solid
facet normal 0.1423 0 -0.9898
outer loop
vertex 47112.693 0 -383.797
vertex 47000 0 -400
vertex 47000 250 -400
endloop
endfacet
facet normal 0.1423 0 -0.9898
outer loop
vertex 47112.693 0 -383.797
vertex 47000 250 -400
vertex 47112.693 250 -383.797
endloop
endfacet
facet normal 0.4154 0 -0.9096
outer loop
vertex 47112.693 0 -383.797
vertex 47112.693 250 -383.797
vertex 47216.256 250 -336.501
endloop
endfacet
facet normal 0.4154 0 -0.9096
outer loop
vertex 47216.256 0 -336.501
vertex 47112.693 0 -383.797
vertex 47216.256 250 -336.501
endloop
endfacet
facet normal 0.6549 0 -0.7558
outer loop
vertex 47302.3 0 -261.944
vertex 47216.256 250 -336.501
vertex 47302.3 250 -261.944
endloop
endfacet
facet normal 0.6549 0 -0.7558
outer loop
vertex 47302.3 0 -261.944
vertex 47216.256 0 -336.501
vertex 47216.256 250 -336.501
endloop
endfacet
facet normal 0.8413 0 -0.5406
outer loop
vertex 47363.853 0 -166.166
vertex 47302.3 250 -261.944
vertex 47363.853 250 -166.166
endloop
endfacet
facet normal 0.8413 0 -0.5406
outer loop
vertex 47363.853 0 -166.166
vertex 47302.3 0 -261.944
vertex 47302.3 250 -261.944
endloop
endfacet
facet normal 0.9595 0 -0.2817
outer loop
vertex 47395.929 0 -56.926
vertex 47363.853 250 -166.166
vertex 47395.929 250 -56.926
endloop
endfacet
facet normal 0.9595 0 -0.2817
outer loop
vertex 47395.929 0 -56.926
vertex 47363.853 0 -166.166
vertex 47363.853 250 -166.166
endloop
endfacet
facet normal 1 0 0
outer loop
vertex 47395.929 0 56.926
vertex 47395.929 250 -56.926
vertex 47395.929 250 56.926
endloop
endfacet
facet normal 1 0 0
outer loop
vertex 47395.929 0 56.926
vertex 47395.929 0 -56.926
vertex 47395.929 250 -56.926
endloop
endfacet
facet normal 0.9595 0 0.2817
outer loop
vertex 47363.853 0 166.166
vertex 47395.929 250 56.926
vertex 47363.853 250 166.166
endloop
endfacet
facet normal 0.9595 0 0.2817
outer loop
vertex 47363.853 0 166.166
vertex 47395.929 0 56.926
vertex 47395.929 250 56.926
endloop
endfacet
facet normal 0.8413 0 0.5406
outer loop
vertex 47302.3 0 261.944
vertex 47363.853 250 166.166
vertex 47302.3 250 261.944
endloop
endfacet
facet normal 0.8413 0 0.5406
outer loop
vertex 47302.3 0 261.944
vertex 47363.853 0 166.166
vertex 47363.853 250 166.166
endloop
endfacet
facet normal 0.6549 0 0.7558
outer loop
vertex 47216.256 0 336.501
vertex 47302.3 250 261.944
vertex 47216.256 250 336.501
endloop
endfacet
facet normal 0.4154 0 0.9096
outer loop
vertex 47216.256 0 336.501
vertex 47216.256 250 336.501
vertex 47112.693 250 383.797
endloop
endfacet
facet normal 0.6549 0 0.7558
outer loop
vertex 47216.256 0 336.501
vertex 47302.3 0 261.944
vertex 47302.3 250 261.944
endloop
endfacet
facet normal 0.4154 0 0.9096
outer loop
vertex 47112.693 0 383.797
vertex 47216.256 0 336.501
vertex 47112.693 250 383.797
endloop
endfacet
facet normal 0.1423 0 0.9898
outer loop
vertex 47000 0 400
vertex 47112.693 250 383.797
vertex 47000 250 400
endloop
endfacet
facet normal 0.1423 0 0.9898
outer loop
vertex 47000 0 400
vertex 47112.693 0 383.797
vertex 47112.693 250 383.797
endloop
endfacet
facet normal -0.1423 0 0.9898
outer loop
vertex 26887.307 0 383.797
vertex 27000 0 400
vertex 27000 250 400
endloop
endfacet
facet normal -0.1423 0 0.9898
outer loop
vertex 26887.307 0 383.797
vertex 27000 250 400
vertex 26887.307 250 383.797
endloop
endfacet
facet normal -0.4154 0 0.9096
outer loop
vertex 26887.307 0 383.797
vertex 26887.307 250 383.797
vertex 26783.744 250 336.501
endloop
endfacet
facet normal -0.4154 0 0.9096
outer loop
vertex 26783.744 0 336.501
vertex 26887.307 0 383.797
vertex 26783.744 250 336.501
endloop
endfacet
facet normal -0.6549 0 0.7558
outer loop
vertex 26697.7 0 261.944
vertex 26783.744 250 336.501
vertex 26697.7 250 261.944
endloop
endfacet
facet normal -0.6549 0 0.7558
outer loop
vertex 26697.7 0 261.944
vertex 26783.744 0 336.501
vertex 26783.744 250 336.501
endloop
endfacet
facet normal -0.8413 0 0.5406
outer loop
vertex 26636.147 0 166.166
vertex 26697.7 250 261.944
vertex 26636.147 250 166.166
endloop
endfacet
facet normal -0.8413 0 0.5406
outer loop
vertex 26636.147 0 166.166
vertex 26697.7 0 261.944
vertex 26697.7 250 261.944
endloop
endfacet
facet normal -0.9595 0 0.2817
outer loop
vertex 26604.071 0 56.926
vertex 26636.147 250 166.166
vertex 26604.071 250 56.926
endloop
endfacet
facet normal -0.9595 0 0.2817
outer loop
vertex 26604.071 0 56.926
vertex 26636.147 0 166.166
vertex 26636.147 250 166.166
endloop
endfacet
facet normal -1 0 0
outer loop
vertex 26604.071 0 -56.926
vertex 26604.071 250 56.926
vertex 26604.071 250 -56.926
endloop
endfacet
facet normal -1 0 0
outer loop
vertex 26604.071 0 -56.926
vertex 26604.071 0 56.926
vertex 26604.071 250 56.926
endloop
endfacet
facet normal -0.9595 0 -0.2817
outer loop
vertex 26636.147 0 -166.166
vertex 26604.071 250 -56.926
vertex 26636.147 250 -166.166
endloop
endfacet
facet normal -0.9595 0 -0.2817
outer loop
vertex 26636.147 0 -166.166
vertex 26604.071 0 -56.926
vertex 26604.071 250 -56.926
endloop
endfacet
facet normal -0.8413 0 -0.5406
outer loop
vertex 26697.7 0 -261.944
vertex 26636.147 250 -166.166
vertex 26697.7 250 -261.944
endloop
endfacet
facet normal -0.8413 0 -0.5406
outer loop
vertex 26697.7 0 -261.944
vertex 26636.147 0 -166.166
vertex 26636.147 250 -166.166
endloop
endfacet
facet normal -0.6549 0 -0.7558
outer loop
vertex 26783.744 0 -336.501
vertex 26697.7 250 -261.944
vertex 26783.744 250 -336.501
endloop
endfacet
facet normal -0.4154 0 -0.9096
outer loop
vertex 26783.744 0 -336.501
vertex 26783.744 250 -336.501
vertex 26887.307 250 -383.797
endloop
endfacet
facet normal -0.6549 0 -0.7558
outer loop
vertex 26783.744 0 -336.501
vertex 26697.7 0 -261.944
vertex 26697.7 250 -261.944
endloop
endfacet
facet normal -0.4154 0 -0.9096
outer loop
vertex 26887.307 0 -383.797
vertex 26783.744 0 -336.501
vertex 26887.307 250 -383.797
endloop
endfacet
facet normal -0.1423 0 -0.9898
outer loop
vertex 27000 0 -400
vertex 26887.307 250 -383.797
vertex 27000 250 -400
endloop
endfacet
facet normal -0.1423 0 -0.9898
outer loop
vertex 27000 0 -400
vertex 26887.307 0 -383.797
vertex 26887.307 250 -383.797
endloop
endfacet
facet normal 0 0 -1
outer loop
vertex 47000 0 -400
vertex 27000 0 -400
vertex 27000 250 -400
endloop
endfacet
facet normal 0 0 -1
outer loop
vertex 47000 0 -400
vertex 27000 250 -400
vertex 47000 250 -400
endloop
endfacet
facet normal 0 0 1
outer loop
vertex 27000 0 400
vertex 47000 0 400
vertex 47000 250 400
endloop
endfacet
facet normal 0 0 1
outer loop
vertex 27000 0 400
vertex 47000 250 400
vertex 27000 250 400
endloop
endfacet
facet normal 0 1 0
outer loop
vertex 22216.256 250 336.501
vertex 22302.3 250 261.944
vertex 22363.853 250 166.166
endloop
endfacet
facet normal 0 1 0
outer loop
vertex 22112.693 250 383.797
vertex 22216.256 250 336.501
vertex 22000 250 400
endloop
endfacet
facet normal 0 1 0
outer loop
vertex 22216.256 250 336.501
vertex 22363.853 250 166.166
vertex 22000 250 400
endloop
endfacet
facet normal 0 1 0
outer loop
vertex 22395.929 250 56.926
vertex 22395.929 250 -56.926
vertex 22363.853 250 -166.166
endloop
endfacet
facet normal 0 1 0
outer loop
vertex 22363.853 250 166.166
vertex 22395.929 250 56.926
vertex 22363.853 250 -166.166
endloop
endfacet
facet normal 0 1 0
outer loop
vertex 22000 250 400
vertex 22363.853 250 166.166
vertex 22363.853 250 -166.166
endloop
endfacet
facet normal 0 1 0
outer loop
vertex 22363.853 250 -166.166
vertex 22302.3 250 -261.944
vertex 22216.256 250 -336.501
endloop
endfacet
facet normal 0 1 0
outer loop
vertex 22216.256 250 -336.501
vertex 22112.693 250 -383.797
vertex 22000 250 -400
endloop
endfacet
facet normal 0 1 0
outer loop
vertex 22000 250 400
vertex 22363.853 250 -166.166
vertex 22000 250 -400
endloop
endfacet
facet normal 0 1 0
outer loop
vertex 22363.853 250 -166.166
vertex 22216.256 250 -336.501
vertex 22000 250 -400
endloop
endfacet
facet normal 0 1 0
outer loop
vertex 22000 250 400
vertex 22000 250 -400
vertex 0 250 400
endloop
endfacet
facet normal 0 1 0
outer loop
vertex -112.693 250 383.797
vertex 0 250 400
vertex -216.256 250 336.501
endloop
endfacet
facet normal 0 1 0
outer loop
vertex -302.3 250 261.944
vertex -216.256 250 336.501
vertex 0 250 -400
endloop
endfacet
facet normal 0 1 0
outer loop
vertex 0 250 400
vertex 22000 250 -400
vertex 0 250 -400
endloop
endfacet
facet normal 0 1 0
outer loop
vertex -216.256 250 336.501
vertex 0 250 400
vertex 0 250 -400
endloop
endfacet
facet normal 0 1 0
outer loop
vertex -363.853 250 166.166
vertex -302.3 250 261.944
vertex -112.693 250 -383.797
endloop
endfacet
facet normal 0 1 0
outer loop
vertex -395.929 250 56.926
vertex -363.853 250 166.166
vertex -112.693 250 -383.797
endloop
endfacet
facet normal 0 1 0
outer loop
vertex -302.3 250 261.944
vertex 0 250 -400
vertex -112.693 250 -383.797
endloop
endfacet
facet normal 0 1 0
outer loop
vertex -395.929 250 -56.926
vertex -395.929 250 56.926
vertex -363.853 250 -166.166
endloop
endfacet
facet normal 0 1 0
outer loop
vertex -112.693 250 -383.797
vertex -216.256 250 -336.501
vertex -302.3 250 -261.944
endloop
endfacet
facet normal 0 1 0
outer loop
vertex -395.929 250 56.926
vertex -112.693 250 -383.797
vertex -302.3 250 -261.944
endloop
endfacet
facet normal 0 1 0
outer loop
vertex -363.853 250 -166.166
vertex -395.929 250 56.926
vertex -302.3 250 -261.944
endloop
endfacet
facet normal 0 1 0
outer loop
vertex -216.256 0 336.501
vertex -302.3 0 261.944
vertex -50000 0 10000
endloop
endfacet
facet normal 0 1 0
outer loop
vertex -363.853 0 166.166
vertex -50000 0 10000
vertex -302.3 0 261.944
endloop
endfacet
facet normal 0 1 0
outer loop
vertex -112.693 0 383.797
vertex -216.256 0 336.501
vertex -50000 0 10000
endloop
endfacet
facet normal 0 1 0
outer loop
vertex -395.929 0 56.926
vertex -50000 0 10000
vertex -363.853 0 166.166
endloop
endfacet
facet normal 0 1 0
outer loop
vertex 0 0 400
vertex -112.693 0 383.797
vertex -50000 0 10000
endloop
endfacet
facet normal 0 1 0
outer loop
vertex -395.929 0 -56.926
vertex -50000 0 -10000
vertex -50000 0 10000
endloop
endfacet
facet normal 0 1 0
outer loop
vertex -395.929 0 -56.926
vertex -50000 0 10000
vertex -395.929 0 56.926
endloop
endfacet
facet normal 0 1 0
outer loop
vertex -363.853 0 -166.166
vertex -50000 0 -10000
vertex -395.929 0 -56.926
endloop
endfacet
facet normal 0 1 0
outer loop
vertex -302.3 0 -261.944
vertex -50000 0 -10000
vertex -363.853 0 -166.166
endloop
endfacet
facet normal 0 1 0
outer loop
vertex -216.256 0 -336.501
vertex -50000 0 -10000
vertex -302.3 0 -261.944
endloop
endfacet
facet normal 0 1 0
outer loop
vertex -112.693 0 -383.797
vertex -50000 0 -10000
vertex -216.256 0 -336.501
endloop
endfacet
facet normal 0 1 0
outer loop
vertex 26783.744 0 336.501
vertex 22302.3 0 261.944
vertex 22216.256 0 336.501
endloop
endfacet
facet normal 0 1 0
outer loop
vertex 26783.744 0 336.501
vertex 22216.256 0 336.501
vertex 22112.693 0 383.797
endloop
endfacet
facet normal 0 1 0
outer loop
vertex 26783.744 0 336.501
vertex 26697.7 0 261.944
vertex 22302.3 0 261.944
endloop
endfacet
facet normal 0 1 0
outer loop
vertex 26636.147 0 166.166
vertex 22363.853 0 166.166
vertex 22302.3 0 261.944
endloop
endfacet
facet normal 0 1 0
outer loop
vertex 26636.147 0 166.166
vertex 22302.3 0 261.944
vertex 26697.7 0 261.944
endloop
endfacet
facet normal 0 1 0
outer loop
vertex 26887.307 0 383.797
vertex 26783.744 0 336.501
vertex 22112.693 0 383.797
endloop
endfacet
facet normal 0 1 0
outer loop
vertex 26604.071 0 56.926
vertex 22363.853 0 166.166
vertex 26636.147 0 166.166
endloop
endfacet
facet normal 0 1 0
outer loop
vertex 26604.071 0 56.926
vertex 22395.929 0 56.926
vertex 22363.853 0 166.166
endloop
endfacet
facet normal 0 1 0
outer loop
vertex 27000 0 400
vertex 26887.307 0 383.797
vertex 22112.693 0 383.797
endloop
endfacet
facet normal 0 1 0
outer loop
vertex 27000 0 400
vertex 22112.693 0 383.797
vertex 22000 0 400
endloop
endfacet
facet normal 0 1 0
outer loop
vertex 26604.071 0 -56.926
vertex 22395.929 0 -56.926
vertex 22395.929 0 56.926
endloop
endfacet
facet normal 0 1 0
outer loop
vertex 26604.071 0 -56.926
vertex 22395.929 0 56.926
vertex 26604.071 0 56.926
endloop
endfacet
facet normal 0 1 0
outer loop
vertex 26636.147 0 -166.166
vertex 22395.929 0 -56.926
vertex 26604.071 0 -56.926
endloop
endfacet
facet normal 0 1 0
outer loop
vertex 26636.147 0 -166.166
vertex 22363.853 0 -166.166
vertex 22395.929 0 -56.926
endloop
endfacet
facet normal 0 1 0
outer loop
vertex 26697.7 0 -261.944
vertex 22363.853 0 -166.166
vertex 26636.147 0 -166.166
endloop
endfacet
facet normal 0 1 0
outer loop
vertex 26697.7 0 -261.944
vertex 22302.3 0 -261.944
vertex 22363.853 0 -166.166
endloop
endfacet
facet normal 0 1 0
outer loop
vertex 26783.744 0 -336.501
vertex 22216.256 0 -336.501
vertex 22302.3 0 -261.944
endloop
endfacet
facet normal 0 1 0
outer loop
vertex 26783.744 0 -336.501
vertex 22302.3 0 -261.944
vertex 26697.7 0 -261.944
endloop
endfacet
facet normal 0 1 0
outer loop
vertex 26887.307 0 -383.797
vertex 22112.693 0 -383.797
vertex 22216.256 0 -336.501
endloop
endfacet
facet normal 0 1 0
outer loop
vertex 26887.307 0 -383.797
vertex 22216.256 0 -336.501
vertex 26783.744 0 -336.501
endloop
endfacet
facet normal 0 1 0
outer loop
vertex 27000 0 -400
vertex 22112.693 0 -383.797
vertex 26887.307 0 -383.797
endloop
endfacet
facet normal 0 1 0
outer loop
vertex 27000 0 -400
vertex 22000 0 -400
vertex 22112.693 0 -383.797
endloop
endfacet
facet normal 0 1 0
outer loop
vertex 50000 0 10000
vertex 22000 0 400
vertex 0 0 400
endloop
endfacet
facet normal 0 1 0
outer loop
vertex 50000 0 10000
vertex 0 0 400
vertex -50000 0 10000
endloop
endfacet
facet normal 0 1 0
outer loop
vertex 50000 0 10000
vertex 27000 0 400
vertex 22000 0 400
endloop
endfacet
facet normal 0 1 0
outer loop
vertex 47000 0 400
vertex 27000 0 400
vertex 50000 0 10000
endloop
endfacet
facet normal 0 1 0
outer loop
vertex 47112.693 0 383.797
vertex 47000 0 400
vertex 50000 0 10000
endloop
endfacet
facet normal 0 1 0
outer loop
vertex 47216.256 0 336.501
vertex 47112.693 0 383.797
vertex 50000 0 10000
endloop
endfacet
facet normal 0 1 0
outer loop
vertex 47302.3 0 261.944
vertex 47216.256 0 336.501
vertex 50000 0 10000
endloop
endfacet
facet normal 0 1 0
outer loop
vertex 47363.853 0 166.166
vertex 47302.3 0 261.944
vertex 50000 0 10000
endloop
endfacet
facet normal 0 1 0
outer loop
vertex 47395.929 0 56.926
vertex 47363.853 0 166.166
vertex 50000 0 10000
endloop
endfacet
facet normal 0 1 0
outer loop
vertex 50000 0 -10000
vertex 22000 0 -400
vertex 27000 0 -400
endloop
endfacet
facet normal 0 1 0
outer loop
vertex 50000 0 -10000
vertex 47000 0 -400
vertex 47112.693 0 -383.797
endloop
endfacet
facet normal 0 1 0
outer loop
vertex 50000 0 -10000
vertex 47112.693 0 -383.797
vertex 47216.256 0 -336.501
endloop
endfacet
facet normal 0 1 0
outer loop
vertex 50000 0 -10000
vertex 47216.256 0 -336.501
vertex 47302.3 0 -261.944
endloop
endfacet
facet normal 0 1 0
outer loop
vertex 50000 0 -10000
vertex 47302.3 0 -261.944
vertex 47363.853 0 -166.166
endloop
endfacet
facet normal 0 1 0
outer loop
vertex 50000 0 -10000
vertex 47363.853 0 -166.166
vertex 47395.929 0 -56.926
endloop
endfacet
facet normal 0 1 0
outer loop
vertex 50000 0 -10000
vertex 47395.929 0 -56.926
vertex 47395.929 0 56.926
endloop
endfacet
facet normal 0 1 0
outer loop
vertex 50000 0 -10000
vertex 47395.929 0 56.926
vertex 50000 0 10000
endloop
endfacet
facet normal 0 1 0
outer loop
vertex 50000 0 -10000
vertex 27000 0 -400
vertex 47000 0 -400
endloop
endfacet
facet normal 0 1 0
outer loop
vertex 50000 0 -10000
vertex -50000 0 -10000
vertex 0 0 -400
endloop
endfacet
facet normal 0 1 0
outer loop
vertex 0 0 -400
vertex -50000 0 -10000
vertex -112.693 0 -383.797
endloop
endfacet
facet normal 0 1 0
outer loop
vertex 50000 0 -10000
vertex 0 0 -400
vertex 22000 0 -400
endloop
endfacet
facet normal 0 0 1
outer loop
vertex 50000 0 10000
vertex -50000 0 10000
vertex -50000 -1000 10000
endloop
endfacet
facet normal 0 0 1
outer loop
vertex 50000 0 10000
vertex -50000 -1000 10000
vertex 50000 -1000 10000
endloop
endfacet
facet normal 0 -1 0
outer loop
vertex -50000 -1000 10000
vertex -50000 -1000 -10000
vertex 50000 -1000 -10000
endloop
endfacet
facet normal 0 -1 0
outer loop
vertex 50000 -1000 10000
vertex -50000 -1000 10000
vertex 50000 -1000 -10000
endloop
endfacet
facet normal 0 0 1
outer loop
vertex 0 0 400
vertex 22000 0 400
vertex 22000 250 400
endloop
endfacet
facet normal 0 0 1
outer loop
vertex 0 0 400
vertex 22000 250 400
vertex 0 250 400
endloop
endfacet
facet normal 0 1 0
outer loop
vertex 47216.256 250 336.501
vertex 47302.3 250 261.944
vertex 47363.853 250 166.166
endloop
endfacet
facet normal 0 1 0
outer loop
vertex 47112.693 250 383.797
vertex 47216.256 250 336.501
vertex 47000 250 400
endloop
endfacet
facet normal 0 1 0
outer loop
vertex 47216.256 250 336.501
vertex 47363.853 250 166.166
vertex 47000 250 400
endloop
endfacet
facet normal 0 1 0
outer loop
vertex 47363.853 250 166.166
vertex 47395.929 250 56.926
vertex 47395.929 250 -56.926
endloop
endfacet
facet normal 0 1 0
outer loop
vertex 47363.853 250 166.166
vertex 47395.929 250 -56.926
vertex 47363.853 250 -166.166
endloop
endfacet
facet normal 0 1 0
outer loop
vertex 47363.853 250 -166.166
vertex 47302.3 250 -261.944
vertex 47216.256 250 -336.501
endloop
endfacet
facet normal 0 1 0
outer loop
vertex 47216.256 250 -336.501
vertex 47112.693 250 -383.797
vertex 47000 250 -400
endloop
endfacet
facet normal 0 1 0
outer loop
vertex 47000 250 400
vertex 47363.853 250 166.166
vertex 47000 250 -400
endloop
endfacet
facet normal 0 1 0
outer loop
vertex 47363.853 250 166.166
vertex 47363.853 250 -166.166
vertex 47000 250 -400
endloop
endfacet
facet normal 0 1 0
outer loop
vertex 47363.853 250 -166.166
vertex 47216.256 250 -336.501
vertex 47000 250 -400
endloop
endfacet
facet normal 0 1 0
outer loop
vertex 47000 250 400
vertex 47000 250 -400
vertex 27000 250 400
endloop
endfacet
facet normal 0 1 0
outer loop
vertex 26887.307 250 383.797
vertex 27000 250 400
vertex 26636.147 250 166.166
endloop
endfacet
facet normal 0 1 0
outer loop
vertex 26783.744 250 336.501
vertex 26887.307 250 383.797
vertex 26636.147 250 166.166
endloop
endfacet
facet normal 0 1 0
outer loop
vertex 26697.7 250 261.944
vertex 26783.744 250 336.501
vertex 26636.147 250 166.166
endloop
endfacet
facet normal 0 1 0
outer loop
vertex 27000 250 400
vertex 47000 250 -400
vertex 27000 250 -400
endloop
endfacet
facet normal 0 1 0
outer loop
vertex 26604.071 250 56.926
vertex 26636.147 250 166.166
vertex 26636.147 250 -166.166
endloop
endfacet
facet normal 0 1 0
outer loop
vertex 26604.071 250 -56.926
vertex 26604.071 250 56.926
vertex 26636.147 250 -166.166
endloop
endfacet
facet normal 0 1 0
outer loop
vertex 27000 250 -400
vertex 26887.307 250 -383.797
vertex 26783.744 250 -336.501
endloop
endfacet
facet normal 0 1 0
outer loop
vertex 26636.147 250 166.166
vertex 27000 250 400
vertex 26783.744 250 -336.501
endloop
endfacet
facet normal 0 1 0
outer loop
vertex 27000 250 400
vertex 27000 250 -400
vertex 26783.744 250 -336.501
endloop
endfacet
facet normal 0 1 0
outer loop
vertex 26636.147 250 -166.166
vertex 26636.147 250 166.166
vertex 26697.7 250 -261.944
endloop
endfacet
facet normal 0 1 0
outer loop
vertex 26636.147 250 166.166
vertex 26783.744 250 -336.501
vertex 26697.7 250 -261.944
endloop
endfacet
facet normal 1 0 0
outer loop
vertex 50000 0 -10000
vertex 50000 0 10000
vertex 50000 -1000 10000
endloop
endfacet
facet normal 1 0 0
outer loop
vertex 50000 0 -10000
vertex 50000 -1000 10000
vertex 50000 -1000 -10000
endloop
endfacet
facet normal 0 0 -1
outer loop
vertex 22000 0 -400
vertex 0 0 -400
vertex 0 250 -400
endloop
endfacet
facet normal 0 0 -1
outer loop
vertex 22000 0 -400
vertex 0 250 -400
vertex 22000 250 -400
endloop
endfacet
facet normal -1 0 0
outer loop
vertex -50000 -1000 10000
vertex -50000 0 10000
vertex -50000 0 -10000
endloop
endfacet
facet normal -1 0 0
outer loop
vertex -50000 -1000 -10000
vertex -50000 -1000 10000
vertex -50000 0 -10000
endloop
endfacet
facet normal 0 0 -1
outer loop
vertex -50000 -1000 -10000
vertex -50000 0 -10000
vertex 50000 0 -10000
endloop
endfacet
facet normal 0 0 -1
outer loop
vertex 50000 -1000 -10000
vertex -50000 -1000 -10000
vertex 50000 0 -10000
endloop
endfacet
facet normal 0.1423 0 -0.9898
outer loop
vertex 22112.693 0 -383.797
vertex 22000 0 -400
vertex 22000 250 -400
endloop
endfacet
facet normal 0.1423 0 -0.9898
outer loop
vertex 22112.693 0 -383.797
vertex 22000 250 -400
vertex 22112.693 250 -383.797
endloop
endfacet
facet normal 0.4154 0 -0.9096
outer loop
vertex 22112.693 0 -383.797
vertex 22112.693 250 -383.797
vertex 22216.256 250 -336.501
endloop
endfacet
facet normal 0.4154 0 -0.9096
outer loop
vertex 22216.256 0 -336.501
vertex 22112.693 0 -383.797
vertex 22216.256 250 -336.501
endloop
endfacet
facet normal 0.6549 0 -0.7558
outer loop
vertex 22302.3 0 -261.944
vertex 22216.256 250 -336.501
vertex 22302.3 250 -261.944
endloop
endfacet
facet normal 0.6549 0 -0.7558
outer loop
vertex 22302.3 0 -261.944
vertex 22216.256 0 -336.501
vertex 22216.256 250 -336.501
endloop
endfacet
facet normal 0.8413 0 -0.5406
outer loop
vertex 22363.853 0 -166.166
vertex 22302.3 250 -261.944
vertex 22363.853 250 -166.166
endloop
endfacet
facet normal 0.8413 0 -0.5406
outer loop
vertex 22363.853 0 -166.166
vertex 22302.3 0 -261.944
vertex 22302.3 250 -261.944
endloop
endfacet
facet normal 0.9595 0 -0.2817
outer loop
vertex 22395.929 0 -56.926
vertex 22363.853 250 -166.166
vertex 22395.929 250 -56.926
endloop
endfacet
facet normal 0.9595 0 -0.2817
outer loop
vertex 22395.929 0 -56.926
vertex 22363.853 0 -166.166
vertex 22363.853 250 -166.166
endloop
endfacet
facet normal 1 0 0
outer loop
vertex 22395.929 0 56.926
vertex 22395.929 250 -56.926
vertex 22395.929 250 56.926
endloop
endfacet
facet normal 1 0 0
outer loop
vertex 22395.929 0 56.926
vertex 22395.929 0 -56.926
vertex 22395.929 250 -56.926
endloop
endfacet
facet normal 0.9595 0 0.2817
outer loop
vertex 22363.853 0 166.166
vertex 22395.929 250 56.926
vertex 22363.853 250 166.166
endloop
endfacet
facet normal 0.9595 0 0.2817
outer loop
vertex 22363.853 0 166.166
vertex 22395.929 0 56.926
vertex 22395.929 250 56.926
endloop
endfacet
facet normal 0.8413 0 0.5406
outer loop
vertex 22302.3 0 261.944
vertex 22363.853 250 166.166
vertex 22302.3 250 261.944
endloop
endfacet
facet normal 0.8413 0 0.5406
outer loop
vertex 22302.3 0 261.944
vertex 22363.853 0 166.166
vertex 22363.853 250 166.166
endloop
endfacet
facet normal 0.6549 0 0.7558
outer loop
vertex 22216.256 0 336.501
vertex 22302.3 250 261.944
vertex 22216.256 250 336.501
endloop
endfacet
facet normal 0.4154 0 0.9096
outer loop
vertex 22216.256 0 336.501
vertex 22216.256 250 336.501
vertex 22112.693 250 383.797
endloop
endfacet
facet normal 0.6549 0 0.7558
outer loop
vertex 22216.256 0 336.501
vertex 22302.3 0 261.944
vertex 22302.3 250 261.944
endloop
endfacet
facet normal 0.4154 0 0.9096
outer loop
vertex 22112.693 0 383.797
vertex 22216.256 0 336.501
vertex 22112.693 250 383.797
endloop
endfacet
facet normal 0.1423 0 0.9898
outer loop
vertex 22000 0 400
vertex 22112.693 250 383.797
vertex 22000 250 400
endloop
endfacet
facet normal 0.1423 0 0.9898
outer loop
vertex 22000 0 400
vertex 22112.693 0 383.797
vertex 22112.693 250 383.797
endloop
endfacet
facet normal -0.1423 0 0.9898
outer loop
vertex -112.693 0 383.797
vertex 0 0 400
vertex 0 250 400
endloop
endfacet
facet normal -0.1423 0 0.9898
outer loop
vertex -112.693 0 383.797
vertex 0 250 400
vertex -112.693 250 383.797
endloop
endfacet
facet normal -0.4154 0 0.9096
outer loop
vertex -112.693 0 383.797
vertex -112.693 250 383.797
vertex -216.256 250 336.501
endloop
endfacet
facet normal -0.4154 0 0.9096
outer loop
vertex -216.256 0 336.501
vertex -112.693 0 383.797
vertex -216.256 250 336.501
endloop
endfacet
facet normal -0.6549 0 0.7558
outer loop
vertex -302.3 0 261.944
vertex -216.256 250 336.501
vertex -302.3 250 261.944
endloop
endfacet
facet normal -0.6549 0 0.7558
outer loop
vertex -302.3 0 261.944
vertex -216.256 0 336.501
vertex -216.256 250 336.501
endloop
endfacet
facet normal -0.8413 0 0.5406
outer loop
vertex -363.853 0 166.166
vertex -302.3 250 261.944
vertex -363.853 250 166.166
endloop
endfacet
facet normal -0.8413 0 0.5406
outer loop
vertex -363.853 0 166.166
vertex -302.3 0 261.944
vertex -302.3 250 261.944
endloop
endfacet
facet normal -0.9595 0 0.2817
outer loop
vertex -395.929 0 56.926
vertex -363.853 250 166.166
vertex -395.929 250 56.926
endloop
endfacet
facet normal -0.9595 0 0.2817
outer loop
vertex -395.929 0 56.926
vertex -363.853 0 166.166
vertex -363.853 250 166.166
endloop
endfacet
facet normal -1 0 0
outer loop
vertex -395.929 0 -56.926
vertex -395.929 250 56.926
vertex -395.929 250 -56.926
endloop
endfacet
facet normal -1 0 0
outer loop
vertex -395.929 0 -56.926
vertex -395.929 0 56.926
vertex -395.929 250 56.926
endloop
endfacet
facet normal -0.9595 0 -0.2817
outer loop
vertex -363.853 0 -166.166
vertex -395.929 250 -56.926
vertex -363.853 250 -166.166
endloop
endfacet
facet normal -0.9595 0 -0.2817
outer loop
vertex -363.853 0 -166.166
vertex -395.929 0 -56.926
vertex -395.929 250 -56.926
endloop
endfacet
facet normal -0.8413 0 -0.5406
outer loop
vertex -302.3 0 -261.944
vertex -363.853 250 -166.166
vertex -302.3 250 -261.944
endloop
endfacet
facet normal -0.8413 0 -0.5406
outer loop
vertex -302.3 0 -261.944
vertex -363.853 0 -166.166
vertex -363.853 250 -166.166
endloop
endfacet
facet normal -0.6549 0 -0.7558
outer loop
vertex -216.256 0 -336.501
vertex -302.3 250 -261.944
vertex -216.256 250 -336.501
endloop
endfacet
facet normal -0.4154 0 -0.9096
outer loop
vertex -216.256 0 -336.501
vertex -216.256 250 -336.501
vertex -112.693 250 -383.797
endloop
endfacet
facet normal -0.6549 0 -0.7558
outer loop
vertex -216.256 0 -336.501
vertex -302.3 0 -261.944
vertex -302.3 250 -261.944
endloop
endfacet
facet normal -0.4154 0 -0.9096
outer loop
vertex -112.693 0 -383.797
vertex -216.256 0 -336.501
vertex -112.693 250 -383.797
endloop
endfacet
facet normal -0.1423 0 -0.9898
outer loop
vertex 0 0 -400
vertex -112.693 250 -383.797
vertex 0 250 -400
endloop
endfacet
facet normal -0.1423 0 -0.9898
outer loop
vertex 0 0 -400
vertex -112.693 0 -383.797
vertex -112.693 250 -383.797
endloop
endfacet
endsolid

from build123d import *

# Parameters (mm, degrees)
SKETCH1_W           = 100000
SKETCH1_H           = 20000
BOSS_EXTRUDE1_DEPTH = 1000
BOSS_EXTRUDE2_DEPTH = 250


with BuildPart() as part:
    # Sketch1 → Boss-Extrude1 (new body)
    with BuildSketch(Plane(origin=(0, 0, 0), x_dir=(1, 0, 0), z_dir=(0, 1, 0))):
        Rectangle(SKETCH1_W, SKETCH1_H)
    extrude(amount=-BOSS_EXTRUDE1_DEPTH)

    # Sketch2 → Boss-Extrude2 (add)
    with BuildSketch(Plane(origin=(0, 0, 0), x_dir=(1, 0, 0), z_dir=(0, 1, 0))):
        with BuildLine():
            Line((47000, -400), (27000, -400))
            ThreePointArc((27000, -400), (26600, 0), (27000, 400))
            Line((27000, 400), (47000, 400))
            ThreePointArc((47000, 400), (47400, 0), (47000, -400))
        make_face()
        with BuildLine():
            Line((0, 400), (22000, 400))
            ThreePointArc((22000, 400), (22400, 0), (22000, -400))
            Line((22000, -400), (0, -400))
            ThreePointArc((0, -400), (-400, 0), (0, 400))
        make_face()
    extrude(amount=BOSS_EXTRUDE2_DEPTH)


solid = part.part
